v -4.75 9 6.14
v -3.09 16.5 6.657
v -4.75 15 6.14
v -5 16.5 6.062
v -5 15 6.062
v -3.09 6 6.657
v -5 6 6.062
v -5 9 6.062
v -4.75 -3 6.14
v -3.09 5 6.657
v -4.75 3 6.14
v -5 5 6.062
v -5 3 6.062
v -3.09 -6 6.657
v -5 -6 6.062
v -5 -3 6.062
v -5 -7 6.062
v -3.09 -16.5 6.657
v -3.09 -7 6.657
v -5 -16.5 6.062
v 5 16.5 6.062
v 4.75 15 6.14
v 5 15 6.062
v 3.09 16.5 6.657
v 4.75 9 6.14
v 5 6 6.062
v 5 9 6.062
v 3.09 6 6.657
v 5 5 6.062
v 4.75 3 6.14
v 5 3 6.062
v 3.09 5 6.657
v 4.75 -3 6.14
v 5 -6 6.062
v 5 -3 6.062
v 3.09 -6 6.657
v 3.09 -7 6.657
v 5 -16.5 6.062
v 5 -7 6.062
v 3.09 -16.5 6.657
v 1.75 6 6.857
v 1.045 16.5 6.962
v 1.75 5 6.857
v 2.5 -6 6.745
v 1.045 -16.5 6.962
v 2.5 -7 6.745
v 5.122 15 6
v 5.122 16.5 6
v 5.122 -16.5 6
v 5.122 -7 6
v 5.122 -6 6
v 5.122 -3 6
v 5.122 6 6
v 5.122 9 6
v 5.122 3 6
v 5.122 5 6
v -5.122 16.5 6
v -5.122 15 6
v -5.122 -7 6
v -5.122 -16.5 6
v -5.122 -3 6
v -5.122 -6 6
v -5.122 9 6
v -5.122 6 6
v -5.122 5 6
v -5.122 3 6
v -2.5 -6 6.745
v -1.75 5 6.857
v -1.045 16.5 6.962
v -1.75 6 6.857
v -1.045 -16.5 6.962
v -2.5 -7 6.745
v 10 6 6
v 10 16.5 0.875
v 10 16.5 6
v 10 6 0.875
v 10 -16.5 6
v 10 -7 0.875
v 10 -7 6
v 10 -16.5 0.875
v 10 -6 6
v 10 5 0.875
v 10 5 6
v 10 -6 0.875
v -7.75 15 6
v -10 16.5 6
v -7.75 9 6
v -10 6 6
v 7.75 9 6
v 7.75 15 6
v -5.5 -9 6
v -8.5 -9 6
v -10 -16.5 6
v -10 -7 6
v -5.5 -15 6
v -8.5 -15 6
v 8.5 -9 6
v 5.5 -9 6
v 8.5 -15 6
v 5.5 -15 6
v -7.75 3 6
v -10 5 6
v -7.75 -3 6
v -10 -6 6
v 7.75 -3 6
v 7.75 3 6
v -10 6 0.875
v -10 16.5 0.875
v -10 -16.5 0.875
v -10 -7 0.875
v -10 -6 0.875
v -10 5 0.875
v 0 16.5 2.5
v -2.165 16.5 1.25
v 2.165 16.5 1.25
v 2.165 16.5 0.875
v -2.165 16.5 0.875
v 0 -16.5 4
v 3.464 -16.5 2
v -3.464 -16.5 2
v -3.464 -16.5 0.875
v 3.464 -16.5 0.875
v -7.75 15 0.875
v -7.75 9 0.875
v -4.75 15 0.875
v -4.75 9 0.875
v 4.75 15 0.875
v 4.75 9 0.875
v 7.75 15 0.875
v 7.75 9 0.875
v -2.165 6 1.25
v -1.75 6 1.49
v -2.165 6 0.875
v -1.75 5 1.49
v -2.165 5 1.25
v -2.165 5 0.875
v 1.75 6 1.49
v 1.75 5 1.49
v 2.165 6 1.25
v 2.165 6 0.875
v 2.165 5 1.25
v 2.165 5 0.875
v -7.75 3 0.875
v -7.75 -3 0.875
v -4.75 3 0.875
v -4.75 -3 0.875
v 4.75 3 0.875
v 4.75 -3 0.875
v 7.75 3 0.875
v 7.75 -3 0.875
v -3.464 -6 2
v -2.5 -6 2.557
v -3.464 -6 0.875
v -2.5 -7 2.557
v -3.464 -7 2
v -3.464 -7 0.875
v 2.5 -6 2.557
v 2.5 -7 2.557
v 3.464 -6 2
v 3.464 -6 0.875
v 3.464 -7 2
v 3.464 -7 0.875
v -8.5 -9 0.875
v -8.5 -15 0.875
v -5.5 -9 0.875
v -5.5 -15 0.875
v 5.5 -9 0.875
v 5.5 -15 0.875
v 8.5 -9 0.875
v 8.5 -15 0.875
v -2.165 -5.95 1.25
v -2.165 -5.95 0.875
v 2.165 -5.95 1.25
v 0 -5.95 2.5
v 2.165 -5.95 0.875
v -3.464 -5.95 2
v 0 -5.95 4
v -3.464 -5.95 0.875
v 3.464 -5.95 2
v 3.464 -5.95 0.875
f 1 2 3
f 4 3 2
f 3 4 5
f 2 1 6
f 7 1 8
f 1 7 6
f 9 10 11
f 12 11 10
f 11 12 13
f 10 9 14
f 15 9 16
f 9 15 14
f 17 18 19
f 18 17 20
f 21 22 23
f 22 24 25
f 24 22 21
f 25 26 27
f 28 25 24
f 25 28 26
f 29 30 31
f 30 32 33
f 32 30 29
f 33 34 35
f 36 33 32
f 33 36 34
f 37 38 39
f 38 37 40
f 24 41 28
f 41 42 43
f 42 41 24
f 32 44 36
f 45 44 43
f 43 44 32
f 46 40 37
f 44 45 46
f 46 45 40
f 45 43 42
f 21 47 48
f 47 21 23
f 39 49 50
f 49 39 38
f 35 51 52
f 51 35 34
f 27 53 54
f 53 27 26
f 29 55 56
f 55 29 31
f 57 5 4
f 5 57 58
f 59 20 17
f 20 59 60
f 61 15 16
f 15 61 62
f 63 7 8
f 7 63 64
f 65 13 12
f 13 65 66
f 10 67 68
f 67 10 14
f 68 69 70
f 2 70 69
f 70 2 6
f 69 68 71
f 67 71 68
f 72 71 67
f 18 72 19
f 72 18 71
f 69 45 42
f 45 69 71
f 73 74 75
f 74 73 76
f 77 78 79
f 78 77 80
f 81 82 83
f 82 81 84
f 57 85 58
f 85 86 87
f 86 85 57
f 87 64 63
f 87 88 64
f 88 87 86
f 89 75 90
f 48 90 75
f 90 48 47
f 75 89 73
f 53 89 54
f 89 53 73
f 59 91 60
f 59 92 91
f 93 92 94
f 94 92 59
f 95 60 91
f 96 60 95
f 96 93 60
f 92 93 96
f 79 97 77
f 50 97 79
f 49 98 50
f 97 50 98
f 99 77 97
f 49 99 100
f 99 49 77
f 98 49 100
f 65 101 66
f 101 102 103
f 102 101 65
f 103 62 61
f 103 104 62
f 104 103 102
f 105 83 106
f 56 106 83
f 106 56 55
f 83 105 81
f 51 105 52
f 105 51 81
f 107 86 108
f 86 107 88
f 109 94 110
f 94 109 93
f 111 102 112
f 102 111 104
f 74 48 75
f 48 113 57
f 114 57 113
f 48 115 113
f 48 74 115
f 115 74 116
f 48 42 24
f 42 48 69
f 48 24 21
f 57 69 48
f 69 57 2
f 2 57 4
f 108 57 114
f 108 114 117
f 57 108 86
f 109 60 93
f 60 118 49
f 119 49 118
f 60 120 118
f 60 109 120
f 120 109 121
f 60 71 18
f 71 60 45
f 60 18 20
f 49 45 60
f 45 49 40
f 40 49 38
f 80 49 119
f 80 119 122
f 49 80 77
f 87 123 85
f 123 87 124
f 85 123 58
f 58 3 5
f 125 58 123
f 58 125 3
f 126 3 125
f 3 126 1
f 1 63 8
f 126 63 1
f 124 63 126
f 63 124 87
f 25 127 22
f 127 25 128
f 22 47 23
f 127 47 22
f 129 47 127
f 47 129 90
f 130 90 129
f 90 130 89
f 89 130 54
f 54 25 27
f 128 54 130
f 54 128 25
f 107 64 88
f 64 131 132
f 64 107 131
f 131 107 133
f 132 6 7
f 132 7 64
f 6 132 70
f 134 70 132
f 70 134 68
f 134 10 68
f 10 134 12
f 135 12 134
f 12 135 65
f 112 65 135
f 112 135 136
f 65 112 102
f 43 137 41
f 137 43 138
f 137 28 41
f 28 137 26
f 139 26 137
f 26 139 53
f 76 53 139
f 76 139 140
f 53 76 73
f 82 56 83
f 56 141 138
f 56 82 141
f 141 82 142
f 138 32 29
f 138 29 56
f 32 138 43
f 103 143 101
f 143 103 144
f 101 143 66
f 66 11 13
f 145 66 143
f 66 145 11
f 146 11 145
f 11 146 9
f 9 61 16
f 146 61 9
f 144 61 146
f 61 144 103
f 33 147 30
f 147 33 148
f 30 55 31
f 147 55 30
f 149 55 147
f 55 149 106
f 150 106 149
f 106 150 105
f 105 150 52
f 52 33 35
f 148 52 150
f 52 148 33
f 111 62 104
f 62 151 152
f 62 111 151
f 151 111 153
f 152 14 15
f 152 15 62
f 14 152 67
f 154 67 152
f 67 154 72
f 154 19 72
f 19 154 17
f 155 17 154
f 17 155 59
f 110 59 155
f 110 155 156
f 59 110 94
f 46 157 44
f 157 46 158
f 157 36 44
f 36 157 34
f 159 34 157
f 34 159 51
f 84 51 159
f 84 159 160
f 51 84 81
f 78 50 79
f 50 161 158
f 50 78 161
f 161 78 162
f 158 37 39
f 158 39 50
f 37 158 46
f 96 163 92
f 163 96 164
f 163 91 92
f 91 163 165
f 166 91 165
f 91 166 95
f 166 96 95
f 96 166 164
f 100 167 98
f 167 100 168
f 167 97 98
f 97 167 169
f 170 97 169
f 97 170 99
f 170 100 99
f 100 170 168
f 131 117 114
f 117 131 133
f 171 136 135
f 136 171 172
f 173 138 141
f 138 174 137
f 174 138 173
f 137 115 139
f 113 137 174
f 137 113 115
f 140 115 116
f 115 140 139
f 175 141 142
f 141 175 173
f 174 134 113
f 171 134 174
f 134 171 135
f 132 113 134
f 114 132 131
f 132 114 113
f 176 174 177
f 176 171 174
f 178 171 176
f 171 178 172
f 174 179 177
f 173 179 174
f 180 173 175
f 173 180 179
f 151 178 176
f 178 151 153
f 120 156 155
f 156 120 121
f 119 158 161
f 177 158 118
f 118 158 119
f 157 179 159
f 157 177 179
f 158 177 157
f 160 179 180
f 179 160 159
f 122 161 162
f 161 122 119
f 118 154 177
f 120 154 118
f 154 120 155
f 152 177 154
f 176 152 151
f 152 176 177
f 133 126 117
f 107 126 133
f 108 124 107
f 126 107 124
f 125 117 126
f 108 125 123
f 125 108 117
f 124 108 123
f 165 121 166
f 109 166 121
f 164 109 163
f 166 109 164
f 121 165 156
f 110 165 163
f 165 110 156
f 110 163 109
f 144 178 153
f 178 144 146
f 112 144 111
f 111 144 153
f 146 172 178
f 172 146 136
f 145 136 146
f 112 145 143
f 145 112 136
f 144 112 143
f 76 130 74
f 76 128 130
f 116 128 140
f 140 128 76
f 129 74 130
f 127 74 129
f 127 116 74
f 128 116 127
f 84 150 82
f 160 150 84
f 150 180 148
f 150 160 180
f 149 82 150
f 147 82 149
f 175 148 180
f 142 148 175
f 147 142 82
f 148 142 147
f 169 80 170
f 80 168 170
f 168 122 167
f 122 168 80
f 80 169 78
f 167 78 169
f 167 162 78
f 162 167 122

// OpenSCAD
// Released under GPL 2.0 and later.
// Copyright Rob Gilson 2010

// This is a printable threaded rod / motor shaft coupling.
// You use zip ties through the holes of 2 of these to secure the rod/shaft.


threaded_rod = 8; //mm (diameter)
motor_shaft = 5; //mm (diameter)
coupling_length = 33;//mm
coupling_radius = 10;//mm
coupling_skewing=0.7;
//The coupling length per clamp including spacing and seperators
clamp_seperator_spacing = 12;

$fs = 0.01;


difference()
{
	coupling_exterior();
	// motor shaft holder
	translate([0,coupling_length/4, 0]) rotate([90,90,0])
		cylinder (h = coupling_length/2+0.1+clamp_seperator_spacing,  r=motor_shaft/2, center=true, $fn=6);
	//threaded rod holder
	translate([0,-coupling_length/4-clamp_seperator_spacing/2, 0]) rotate([90,90,0])
		cylinder (h = coupling_length/2+0.1,  r=threaded_rod/2, center=true, $fn=6);

	//removing the bottom so there is some room to flex and tighten the coupling
	translate([0,0,-coupling_radius/2]) cube([100,100,coupling_radius+motor_shaft*0.35], center=true);
}

//Uses the coupling_2d_outline to generate a shell for the coupling
module coupling_exterior() intersection()
{
	translate([0,0, coupling_radius]) linear_extrude(height = 100, center = true)
		coupling_2d_outline();
	union()
	{
		//exterior cyliderical shape
		rotate([90,0,0]) scale([1,coupling_skewing,1])
			cylinder(h = 100, r =coupling_radius, center = true);
		//square extrusion for zip tie hole thickness
		cube([coupling_radius*2,coupling_length,12], center = true);
	}
}

//Generates the zip tie holes and main block in 2d for extruding
module coupling_2d_outline() difference()
{
	//Main block outline
	square(size= [100, coupling_length], center = true);

	// Zip tie holes + clamp seperators
	for (i = [-1, 1]) for (j = [0, 1])
		for (pos = [
			[i*( (coupling_radius - threaded_rod/2)/2 + threaded_rod/2 ),  -clamp_seperator_spacing, 0],
			[i*( (coupling_radius - motor_shaft/2)/2 + motor_shaft/2),  j*clamp_seperator_spacing, 0],
		]) translate(pos)
		{
			//Zip tie hole
			square(size= [3, clamp_seperator_spacing/2], center = true);
			//Clamp seperator
			translate([0,clamp_seperator_spacing/2-0.5,0])
				square(size= [(coupling_radius-motor_shaft/2)*1.2, 1], center = true);
		}
}
